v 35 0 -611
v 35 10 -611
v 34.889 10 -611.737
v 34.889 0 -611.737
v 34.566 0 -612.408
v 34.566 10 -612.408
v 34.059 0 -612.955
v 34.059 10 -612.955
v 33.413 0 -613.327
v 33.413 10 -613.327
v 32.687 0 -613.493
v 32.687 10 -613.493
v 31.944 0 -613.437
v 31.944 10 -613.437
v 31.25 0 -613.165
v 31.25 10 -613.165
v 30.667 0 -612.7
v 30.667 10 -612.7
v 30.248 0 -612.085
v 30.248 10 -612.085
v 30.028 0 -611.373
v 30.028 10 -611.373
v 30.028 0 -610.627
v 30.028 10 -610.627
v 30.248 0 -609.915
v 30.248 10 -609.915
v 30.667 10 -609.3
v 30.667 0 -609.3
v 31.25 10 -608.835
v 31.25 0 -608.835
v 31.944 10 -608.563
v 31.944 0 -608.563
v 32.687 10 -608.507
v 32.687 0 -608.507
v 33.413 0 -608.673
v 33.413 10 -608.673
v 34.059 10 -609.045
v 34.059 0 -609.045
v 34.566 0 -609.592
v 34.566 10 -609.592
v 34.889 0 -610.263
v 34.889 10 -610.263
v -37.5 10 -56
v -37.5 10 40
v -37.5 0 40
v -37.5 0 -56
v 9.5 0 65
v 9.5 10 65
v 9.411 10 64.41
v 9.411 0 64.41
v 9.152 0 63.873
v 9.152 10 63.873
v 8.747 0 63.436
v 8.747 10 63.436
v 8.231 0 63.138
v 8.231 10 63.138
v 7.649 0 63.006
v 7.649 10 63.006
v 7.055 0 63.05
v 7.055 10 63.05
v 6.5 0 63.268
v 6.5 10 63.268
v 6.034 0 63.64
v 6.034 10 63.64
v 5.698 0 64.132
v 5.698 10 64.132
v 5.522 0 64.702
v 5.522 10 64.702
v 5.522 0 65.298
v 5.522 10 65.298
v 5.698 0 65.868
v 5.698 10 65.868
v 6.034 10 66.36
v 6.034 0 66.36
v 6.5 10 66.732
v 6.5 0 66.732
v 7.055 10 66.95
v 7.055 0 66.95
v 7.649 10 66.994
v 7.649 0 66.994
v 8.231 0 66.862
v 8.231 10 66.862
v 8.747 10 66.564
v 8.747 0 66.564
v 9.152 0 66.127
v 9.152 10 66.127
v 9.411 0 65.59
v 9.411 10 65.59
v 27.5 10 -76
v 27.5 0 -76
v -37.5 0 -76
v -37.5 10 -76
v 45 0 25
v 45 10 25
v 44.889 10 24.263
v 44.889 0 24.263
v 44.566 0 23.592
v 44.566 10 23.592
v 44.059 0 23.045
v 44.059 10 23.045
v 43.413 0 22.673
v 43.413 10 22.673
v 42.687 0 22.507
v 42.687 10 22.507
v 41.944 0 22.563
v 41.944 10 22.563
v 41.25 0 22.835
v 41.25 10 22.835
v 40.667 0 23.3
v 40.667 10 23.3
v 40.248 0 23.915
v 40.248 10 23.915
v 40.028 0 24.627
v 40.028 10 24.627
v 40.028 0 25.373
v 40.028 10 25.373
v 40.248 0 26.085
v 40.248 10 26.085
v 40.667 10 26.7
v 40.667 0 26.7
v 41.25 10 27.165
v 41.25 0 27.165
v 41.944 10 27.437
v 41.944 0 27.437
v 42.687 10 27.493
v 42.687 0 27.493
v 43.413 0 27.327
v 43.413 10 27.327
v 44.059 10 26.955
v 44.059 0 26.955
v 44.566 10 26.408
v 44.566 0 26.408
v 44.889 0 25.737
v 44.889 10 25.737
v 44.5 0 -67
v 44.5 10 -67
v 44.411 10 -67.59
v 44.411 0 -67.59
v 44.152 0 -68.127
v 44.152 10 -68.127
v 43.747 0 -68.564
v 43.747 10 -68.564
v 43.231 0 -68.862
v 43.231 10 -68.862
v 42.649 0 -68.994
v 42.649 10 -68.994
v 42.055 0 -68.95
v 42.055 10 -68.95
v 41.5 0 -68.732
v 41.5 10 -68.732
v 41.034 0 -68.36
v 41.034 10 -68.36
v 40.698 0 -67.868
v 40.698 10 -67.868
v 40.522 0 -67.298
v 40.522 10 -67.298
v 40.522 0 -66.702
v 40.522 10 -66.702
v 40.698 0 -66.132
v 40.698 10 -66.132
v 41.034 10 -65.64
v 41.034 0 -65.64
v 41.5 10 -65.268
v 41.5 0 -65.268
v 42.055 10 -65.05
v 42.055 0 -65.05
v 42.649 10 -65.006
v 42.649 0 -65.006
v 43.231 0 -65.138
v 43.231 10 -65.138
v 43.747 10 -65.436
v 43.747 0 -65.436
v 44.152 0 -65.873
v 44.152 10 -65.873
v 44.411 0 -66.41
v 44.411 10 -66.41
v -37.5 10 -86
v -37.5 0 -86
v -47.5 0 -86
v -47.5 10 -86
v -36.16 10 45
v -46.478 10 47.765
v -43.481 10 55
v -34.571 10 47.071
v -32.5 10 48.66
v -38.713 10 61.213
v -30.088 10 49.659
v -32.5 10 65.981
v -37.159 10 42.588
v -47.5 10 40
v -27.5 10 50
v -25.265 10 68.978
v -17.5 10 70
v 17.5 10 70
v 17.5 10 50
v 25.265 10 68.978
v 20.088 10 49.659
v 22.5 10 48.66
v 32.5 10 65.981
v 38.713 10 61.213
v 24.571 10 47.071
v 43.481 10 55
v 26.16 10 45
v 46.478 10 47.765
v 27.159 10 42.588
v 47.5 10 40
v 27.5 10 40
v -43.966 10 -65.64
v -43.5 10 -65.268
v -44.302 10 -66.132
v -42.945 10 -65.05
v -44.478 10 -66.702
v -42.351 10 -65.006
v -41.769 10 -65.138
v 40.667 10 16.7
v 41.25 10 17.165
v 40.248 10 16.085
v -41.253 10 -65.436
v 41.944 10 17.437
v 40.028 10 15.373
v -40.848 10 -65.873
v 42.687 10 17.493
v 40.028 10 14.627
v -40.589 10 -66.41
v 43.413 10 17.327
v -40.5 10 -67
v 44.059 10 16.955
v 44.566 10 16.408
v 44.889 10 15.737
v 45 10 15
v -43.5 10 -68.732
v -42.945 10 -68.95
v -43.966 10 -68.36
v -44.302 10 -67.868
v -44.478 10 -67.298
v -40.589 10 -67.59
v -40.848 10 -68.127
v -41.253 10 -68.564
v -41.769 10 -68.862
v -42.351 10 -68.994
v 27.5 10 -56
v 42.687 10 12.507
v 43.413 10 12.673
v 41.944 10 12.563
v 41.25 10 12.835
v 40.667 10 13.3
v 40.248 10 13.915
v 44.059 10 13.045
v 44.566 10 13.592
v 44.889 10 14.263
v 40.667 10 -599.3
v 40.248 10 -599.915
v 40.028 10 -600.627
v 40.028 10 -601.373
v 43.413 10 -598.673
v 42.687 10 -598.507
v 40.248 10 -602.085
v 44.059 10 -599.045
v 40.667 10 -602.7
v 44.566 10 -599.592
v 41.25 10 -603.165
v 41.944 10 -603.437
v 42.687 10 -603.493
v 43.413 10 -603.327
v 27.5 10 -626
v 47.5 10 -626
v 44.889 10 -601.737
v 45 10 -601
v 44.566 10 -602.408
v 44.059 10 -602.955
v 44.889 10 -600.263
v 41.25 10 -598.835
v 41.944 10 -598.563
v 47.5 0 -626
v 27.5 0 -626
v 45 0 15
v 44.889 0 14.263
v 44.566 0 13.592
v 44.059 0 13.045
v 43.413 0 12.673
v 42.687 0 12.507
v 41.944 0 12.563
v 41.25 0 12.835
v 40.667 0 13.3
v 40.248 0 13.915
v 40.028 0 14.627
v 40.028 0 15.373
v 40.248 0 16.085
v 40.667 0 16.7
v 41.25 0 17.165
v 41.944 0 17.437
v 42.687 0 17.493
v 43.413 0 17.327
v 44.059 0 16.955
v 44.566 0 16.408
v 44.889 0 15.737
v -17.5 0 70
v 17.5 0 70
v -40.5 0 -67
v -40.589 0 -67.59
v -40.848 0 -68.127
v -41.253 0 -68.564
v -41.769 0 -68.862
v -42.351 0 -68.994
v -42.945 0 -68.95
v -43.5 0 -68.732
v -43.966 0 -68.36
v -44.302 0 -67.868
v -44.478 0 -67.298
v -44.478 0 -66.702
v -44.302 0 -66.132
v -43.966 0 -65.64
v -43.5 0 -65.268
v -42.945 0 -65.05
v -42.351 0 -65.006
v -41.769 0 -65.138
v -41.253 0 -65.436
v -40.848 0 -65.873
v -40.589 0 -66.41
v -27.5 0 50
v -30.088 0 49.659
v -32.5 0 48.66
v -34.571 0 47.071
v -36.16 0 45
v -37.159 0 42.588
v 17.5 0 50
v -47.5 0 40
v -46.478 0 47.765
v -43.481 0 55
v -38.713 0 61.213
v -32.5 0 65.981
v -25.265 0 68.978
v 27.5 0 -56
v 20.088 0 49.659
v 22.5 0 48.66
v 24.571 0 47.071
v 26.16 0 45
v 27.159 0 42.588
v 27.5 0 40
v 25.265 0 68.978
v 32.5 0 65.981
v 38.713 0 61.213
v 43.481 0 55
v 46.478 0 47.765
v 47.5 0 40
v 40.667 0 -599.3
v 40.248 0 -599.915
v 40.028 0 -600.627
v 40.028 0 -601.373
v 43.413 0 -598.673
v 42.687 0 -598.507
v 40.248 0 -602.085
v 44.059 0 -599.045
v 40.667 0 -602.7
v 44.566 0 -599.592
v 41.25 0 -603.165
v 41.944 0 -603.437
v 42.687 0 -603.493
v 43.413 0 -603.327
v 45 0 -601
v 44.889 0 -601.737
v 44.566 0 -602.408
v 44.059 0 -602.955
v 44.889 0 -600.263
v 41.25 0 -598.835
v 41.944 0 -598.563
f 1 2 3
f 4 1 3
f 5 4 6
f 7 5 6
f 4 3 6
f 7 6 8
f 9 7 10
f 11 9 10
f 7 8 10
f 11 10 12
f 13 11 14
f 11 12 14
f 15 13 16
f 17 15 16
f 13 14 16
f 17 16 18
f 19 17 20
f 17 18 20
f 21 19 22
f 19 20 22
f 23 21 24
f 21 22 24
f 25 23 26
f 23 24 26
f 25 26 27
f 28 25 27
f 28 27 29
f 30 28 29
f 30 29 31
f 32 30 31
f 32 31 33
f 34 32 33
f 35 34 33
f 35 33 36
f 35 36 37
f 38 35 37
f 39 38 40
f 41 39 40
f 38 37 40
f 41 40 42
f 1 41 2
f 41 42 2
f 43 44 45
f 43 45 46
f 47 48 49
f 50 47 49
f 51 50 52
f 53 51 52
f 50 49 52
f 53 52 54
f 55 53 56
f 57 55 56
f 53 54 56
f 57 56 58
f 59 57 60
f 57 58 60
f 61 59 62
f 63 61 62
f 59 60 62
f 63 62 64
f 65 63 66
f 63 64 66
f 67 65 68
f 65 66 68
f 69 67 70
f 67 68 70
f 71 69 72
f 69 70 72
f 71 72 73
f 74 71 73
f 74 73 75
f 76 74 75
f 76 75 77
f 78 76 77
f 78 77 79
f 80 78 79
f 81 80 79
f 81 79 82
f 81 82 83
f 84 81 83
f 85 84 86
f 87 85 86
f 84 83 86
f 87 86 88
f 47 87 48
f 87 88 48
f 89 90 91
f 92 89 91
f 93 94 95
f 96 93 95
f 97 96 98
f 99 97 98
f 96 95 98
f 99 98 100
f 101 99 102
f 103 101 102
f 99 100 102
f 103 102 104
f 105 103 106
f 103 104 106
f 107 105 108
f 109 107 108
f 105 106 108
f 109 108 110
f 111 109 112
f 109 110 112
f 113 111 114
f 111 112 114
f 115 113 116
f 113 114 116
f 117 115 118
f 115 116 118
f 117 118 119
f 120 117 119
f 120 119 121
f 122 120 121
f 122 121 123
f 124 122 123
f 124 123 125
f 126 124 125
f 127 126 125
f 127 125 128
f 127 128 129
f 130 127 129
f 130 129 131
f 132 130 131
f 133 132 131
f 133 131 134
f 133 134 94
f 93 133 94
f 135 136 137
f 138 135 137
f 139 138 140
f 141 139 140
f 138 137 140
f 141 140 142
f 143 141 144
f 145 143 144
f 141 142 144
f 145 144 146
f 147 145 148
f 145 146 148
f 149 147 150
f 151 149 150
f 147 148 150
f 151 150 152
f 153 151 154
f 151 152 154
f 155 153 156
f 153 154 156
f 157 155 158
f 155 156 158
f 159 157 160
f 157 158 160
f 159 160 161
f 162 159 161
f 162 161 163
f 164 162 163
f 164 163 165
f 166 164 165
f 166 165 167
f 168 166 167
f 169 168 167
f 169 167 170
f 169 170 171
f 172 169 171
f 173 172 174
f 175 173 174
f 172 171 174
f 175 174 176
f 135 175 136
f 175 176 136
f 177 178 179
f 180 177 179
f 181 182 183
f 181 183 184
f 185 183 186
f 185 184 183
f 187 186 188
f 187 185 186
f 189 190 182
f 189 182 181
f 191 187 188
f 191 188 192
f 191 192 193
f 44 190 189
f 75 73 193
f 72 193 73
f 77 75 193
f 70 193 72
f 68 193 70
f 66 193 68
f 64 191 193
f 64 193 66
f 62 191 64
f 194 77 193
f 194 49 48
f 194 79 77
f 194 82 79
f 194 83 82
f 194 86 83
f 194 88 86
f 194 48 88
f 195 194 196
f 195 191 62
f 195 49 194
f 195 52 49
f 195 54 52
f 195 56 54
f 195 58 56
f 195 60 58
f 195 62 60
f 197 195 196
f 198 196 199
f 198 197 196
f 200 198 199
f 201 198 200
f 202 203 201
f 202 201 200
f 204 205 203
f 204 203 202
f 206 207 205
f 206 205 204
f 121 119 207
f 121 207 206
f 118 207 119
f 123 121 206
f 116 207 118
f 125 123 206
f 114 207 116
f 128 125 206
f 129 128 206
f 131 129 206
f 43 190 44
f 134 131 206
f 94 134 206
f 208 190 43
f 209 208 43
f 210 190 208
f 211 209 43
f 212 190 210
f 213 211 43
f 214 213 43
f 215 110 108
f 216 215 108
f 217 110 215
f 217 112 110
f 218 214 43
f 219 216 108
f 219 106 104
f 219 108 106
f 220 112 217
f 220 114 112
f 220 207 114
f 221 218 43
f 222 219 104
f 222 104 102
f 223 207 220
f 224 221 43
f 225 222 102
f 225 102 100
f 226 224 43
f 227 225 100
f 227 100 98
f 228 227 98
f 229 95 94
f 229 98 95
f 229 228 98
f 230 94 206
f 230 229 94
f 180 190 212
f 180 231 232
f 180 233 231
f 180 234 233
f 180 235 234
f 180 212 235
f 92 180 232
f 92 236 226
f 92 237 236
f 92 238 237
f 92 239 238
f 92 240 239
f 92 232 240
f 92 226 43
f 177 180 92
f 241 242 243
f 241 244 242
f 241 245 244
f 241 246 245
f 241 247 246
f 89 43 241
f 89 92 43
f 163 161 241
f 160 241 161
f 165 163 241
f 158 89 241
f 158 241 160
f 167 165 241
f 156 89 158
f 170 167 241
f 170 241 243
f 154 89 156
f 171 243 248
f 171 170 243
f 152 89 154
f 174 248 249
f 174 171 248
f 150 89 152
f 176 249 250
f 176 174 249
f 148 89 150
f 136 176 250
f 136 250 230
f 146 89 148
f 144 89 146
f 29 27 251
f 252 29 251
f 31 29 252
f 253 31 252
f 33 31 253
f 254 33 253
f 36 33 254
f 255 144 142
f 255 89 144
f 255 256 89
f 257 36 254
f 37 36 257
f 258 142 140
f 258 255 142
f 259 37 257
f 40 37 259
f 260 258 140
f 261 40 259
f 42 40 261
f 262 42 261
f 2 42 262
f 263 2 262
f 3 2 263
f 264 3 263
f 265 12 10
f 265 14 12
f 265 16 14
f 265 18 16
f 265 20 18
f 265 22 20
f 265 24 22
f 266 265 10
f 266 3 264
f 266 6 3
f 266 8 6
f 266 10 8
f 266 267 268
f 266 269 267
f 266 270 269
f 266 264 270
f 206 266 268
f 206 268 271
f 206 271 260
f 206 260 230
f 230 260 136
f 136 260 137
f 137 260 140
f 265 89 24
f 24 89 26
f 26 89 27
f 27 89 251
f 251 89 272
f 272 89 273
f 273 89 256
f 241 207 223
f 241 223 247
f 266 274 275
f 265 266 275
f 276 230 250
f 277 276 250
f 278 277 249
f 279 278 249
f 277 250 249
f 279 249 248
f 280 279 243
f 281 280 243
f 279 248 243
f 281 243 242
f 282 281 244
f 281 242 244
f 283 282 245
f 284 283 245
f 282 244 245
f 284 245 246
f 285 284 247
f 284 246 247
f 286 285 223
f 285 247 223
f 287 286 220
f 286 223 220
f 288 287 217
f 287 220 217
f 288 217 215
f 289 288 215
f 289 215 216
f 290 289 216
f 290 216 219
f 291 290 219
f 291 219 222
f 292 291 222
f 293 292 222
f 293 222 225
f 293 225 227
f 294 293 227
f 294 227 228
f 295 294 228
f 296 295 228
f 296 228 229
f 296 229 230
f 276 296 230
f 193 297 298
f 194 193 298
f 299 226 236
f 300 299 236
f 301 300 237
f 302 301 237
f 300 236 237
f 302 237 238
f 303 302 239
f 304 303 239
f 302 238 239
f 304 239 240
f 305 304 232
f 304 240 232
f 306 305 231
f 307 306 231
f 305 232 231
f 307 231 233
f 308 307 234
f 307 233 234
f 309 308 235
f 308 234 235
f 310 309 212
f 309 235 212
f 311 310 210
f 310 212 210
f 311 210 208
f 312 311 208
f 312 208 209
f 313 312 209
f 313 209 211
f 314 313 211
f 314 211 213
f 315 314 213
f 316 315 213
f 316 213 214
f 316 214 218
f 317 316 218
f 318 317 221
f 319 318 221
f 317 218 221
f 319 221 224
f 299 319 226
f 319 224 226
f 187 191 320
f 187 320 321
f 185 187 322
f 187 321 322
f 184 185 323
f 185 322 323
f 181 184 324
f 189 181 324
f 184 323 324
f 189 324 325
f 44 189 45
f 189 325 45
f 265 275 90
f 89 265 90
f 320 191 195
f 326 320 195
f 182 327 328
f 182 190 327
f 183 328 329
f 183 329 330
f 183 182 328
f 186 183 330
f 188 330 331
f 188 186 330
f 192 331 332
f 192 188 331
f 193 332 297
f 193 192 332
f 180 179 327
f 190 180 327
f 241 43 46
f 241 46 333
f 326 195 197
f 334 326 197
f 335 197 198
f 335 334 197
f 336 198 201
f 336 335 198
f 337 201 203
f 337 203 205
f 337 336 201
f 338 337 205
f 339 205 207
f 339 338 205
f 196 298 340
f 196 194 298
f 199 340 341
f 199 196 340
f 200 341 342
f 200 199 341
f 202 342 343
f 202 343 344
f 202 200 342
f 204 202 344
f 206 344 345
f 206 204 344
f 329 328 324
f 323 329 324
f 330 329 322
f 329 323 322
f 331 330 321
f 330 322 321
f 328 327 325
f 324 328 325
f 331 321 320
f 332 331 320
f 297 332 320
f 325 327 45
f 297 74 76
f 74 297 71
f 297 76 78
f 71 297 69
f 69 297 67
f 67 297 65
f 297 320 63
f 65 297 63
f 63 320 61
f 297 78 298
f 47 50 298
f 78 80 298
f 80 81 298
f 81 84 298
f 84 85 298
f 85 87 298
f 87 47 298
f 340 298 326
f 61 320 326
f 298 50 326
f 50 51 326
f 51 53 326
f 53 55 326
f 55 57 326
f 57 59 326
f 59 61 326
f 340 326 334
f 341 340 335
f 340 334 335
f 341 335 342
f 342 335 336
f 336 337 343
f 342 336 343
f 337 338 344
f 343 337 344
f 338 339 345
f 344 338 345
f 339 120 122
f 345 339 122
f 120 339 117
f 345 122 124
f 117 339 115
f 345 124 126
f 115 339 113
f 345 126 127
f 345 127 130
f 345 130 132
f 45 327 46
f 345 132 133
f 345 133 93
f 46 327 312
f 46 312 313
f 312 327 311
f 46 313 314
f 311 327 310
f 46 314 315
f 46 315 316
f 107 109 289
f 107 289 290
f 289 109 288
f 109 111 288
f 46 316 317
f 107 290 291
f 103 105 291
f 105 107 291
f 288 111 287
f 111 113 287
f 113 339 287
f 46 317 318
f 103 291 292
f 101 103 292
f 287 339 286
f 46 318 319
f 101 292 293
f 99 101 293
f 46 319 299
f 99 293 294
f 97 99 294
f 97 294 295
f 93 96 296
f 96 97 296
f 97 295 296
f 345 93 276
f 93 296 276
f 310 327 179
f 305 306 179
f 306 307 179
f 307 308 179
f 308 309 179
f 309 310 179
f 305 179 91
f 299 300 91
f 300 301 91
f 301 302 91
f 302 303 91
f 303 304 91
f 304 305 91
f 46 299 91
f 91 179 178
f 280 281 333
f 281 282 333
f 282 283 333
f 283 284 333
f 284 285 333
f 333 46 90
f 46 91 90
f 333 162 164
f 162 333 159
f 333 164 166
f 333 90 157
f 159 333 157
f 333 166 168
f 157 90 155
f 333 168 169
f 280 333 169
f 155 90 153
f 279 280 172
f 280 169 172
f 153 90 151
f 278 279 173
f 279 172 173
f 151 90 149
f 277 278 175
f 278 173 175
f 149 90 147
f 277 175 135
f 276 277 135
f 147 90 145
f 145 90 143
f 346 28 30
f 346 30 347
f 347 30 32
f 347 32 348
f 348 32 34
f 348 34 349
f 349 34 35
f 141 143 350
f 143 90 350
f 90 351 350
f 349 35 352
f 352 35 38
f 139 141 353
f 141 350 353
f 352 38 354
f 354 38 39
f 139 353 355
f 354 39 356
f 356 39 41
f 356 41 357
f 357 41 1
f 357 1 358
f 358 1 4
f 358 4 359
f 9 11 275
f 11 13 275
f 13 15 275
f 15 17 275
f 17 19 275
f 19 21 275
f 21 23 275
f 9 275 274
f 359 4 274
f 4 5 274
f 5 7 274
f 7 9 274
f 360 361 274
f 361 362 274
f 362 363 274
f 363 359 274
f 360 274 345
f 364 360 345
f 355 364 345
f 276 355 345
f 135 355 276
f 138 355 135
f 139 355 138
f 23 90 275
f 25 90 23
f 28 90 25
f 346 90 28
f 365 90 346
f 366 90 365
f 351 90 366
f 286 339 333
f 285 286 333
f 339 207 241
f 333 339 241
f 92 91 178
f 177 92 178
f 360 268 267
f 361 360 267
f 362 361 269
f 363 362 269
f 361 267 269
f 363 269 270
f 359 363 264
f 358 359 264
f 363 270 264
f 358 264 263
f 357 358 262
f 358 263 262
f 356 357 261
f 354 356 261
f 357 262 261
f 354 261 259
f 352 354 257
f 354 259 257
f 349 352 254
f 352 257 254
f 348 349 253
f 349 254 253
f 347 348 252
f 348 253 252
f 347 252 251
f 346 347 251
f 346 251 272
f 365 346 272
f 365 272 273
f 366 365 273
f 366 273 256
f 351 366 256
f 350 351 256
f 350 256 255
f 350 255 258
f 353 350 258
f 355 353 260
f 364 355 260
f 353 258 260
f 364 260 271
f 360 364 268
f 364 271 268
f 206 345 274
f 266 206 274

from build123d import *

# Parameters (mm, degrees)
BOSS_EXTRUDE1_DEPTH = 10
FILLET2_R           = 30
SKETCH2_R           = 2
CUT_EXTRUDE1_DEPTH  = 10
SKETCH3_R           = 2.5
CUT_EXTRUDE2_DEPTH  = 10
SKETCH4_R           = 2.5
CUT_EXTRUDE3_DEPTH  = 11
SKETCH5_W           = 65
SKETCH5_H           = 106
CUT_EXTRUDE4_DEPTH  = 11
FILLET3_R           = 10


with BuildPart() as part:
    # Sketch1 → Boss-Extrude1 (new body)
    with BuildSketch(Plane(origin=(0, 0, 0), x_dir=(1, 0, 0), z_dir=(0, 1, 0))):
        Polygon((-47.5, 86), (-47.5, -70), (47.5, -70), (47.5, 626), (27.5, 626), (27.5, 76), (-37.5, 76), (-37.5, 86), align=None)
    extrude(amount=BOSS_EXTRUDE1_DEPTH)

    # Fillet2
    fillet2_edges = [part.edges().sort_by_distance(p)[0] for p in [
        (47.5, 5, 70),
        (-47.5, 5, 70),
    ]]
    fillet(fillet2_edges, radius=FILLET2_R)

    # Sketch2 → Cut-Extrude1 (cut)
    with BuildSketch(Plane(origin=(0, 10, 0), x_dir=(1, 0, 0), z_dir=(0, 1, 0))):
        with Locations((-42.5, 67)):
            Circle(SKETCH2_R)
        with Locations((42.5, 67)):
            Circle(SKETCH2_R)
        with Locations((7.5, -65)):
            Circle(SKETCH2_R)
    extrude(amount=-CUT_EXTRUDE1_DEPTH, mode=Mode.SUBTRACT)

    # Sketch3 → Cut-Extrude2 (cut)
    with BuildSketch(Plane(origin=(0, 10, 0), x_dir=(1, 0, 0), z_dir=(0, 1, 0))):
        with Locations((42.5, 601)):
            Circle(SKETCH3_R)
        with Locations((32.5, 611)):
            Circle(SKETCH3_R)
    extrude(amount=-CUT_EXTRUDE2_DEPTH, mode=Mode.SUBTRACT)

    # Sketch4 → Cut-Extrude3 (cut, through all)
    with BuildSketch(Plane(origin=(0, 10, 0), x_dir=(1, 0, 0), z_dir=(0, 1, 0))):
        with Locations((42.5, -25)):
            Circle(SKETCH4_R)
        with Locations((42.5, -15)):
            Circle(SKETCH4_R)
    extrude(amount=-CUT_EXTRUDE3_DEPTH, mode=Mode.SUBTRACT)

    # Sketch5 → Cut-Extrude4 (cut, through all)
    with BuildSketch(Plane(origin=(0, 10, 0), x_dir=(1, 0, 0), z_dir=(0, 1, 0))):
        with Locations((-5, 3)):
            Rectangle(SKETCH5_W, SKETCH5_H)
    extrude(amount=-CUT_EXTRUDE4_DEPTH, mode=Mode.SUBTRACT)

    # Fillet3
    fillet3_edges = [part.edges().sort_by_distance(p)[0] for p in [
        (-37.5, 5, 50),
        (27.5, 5, 50),
    ]]
    fillet(fillet3_edges, radius=FILLET3_R)


solid = part.part
